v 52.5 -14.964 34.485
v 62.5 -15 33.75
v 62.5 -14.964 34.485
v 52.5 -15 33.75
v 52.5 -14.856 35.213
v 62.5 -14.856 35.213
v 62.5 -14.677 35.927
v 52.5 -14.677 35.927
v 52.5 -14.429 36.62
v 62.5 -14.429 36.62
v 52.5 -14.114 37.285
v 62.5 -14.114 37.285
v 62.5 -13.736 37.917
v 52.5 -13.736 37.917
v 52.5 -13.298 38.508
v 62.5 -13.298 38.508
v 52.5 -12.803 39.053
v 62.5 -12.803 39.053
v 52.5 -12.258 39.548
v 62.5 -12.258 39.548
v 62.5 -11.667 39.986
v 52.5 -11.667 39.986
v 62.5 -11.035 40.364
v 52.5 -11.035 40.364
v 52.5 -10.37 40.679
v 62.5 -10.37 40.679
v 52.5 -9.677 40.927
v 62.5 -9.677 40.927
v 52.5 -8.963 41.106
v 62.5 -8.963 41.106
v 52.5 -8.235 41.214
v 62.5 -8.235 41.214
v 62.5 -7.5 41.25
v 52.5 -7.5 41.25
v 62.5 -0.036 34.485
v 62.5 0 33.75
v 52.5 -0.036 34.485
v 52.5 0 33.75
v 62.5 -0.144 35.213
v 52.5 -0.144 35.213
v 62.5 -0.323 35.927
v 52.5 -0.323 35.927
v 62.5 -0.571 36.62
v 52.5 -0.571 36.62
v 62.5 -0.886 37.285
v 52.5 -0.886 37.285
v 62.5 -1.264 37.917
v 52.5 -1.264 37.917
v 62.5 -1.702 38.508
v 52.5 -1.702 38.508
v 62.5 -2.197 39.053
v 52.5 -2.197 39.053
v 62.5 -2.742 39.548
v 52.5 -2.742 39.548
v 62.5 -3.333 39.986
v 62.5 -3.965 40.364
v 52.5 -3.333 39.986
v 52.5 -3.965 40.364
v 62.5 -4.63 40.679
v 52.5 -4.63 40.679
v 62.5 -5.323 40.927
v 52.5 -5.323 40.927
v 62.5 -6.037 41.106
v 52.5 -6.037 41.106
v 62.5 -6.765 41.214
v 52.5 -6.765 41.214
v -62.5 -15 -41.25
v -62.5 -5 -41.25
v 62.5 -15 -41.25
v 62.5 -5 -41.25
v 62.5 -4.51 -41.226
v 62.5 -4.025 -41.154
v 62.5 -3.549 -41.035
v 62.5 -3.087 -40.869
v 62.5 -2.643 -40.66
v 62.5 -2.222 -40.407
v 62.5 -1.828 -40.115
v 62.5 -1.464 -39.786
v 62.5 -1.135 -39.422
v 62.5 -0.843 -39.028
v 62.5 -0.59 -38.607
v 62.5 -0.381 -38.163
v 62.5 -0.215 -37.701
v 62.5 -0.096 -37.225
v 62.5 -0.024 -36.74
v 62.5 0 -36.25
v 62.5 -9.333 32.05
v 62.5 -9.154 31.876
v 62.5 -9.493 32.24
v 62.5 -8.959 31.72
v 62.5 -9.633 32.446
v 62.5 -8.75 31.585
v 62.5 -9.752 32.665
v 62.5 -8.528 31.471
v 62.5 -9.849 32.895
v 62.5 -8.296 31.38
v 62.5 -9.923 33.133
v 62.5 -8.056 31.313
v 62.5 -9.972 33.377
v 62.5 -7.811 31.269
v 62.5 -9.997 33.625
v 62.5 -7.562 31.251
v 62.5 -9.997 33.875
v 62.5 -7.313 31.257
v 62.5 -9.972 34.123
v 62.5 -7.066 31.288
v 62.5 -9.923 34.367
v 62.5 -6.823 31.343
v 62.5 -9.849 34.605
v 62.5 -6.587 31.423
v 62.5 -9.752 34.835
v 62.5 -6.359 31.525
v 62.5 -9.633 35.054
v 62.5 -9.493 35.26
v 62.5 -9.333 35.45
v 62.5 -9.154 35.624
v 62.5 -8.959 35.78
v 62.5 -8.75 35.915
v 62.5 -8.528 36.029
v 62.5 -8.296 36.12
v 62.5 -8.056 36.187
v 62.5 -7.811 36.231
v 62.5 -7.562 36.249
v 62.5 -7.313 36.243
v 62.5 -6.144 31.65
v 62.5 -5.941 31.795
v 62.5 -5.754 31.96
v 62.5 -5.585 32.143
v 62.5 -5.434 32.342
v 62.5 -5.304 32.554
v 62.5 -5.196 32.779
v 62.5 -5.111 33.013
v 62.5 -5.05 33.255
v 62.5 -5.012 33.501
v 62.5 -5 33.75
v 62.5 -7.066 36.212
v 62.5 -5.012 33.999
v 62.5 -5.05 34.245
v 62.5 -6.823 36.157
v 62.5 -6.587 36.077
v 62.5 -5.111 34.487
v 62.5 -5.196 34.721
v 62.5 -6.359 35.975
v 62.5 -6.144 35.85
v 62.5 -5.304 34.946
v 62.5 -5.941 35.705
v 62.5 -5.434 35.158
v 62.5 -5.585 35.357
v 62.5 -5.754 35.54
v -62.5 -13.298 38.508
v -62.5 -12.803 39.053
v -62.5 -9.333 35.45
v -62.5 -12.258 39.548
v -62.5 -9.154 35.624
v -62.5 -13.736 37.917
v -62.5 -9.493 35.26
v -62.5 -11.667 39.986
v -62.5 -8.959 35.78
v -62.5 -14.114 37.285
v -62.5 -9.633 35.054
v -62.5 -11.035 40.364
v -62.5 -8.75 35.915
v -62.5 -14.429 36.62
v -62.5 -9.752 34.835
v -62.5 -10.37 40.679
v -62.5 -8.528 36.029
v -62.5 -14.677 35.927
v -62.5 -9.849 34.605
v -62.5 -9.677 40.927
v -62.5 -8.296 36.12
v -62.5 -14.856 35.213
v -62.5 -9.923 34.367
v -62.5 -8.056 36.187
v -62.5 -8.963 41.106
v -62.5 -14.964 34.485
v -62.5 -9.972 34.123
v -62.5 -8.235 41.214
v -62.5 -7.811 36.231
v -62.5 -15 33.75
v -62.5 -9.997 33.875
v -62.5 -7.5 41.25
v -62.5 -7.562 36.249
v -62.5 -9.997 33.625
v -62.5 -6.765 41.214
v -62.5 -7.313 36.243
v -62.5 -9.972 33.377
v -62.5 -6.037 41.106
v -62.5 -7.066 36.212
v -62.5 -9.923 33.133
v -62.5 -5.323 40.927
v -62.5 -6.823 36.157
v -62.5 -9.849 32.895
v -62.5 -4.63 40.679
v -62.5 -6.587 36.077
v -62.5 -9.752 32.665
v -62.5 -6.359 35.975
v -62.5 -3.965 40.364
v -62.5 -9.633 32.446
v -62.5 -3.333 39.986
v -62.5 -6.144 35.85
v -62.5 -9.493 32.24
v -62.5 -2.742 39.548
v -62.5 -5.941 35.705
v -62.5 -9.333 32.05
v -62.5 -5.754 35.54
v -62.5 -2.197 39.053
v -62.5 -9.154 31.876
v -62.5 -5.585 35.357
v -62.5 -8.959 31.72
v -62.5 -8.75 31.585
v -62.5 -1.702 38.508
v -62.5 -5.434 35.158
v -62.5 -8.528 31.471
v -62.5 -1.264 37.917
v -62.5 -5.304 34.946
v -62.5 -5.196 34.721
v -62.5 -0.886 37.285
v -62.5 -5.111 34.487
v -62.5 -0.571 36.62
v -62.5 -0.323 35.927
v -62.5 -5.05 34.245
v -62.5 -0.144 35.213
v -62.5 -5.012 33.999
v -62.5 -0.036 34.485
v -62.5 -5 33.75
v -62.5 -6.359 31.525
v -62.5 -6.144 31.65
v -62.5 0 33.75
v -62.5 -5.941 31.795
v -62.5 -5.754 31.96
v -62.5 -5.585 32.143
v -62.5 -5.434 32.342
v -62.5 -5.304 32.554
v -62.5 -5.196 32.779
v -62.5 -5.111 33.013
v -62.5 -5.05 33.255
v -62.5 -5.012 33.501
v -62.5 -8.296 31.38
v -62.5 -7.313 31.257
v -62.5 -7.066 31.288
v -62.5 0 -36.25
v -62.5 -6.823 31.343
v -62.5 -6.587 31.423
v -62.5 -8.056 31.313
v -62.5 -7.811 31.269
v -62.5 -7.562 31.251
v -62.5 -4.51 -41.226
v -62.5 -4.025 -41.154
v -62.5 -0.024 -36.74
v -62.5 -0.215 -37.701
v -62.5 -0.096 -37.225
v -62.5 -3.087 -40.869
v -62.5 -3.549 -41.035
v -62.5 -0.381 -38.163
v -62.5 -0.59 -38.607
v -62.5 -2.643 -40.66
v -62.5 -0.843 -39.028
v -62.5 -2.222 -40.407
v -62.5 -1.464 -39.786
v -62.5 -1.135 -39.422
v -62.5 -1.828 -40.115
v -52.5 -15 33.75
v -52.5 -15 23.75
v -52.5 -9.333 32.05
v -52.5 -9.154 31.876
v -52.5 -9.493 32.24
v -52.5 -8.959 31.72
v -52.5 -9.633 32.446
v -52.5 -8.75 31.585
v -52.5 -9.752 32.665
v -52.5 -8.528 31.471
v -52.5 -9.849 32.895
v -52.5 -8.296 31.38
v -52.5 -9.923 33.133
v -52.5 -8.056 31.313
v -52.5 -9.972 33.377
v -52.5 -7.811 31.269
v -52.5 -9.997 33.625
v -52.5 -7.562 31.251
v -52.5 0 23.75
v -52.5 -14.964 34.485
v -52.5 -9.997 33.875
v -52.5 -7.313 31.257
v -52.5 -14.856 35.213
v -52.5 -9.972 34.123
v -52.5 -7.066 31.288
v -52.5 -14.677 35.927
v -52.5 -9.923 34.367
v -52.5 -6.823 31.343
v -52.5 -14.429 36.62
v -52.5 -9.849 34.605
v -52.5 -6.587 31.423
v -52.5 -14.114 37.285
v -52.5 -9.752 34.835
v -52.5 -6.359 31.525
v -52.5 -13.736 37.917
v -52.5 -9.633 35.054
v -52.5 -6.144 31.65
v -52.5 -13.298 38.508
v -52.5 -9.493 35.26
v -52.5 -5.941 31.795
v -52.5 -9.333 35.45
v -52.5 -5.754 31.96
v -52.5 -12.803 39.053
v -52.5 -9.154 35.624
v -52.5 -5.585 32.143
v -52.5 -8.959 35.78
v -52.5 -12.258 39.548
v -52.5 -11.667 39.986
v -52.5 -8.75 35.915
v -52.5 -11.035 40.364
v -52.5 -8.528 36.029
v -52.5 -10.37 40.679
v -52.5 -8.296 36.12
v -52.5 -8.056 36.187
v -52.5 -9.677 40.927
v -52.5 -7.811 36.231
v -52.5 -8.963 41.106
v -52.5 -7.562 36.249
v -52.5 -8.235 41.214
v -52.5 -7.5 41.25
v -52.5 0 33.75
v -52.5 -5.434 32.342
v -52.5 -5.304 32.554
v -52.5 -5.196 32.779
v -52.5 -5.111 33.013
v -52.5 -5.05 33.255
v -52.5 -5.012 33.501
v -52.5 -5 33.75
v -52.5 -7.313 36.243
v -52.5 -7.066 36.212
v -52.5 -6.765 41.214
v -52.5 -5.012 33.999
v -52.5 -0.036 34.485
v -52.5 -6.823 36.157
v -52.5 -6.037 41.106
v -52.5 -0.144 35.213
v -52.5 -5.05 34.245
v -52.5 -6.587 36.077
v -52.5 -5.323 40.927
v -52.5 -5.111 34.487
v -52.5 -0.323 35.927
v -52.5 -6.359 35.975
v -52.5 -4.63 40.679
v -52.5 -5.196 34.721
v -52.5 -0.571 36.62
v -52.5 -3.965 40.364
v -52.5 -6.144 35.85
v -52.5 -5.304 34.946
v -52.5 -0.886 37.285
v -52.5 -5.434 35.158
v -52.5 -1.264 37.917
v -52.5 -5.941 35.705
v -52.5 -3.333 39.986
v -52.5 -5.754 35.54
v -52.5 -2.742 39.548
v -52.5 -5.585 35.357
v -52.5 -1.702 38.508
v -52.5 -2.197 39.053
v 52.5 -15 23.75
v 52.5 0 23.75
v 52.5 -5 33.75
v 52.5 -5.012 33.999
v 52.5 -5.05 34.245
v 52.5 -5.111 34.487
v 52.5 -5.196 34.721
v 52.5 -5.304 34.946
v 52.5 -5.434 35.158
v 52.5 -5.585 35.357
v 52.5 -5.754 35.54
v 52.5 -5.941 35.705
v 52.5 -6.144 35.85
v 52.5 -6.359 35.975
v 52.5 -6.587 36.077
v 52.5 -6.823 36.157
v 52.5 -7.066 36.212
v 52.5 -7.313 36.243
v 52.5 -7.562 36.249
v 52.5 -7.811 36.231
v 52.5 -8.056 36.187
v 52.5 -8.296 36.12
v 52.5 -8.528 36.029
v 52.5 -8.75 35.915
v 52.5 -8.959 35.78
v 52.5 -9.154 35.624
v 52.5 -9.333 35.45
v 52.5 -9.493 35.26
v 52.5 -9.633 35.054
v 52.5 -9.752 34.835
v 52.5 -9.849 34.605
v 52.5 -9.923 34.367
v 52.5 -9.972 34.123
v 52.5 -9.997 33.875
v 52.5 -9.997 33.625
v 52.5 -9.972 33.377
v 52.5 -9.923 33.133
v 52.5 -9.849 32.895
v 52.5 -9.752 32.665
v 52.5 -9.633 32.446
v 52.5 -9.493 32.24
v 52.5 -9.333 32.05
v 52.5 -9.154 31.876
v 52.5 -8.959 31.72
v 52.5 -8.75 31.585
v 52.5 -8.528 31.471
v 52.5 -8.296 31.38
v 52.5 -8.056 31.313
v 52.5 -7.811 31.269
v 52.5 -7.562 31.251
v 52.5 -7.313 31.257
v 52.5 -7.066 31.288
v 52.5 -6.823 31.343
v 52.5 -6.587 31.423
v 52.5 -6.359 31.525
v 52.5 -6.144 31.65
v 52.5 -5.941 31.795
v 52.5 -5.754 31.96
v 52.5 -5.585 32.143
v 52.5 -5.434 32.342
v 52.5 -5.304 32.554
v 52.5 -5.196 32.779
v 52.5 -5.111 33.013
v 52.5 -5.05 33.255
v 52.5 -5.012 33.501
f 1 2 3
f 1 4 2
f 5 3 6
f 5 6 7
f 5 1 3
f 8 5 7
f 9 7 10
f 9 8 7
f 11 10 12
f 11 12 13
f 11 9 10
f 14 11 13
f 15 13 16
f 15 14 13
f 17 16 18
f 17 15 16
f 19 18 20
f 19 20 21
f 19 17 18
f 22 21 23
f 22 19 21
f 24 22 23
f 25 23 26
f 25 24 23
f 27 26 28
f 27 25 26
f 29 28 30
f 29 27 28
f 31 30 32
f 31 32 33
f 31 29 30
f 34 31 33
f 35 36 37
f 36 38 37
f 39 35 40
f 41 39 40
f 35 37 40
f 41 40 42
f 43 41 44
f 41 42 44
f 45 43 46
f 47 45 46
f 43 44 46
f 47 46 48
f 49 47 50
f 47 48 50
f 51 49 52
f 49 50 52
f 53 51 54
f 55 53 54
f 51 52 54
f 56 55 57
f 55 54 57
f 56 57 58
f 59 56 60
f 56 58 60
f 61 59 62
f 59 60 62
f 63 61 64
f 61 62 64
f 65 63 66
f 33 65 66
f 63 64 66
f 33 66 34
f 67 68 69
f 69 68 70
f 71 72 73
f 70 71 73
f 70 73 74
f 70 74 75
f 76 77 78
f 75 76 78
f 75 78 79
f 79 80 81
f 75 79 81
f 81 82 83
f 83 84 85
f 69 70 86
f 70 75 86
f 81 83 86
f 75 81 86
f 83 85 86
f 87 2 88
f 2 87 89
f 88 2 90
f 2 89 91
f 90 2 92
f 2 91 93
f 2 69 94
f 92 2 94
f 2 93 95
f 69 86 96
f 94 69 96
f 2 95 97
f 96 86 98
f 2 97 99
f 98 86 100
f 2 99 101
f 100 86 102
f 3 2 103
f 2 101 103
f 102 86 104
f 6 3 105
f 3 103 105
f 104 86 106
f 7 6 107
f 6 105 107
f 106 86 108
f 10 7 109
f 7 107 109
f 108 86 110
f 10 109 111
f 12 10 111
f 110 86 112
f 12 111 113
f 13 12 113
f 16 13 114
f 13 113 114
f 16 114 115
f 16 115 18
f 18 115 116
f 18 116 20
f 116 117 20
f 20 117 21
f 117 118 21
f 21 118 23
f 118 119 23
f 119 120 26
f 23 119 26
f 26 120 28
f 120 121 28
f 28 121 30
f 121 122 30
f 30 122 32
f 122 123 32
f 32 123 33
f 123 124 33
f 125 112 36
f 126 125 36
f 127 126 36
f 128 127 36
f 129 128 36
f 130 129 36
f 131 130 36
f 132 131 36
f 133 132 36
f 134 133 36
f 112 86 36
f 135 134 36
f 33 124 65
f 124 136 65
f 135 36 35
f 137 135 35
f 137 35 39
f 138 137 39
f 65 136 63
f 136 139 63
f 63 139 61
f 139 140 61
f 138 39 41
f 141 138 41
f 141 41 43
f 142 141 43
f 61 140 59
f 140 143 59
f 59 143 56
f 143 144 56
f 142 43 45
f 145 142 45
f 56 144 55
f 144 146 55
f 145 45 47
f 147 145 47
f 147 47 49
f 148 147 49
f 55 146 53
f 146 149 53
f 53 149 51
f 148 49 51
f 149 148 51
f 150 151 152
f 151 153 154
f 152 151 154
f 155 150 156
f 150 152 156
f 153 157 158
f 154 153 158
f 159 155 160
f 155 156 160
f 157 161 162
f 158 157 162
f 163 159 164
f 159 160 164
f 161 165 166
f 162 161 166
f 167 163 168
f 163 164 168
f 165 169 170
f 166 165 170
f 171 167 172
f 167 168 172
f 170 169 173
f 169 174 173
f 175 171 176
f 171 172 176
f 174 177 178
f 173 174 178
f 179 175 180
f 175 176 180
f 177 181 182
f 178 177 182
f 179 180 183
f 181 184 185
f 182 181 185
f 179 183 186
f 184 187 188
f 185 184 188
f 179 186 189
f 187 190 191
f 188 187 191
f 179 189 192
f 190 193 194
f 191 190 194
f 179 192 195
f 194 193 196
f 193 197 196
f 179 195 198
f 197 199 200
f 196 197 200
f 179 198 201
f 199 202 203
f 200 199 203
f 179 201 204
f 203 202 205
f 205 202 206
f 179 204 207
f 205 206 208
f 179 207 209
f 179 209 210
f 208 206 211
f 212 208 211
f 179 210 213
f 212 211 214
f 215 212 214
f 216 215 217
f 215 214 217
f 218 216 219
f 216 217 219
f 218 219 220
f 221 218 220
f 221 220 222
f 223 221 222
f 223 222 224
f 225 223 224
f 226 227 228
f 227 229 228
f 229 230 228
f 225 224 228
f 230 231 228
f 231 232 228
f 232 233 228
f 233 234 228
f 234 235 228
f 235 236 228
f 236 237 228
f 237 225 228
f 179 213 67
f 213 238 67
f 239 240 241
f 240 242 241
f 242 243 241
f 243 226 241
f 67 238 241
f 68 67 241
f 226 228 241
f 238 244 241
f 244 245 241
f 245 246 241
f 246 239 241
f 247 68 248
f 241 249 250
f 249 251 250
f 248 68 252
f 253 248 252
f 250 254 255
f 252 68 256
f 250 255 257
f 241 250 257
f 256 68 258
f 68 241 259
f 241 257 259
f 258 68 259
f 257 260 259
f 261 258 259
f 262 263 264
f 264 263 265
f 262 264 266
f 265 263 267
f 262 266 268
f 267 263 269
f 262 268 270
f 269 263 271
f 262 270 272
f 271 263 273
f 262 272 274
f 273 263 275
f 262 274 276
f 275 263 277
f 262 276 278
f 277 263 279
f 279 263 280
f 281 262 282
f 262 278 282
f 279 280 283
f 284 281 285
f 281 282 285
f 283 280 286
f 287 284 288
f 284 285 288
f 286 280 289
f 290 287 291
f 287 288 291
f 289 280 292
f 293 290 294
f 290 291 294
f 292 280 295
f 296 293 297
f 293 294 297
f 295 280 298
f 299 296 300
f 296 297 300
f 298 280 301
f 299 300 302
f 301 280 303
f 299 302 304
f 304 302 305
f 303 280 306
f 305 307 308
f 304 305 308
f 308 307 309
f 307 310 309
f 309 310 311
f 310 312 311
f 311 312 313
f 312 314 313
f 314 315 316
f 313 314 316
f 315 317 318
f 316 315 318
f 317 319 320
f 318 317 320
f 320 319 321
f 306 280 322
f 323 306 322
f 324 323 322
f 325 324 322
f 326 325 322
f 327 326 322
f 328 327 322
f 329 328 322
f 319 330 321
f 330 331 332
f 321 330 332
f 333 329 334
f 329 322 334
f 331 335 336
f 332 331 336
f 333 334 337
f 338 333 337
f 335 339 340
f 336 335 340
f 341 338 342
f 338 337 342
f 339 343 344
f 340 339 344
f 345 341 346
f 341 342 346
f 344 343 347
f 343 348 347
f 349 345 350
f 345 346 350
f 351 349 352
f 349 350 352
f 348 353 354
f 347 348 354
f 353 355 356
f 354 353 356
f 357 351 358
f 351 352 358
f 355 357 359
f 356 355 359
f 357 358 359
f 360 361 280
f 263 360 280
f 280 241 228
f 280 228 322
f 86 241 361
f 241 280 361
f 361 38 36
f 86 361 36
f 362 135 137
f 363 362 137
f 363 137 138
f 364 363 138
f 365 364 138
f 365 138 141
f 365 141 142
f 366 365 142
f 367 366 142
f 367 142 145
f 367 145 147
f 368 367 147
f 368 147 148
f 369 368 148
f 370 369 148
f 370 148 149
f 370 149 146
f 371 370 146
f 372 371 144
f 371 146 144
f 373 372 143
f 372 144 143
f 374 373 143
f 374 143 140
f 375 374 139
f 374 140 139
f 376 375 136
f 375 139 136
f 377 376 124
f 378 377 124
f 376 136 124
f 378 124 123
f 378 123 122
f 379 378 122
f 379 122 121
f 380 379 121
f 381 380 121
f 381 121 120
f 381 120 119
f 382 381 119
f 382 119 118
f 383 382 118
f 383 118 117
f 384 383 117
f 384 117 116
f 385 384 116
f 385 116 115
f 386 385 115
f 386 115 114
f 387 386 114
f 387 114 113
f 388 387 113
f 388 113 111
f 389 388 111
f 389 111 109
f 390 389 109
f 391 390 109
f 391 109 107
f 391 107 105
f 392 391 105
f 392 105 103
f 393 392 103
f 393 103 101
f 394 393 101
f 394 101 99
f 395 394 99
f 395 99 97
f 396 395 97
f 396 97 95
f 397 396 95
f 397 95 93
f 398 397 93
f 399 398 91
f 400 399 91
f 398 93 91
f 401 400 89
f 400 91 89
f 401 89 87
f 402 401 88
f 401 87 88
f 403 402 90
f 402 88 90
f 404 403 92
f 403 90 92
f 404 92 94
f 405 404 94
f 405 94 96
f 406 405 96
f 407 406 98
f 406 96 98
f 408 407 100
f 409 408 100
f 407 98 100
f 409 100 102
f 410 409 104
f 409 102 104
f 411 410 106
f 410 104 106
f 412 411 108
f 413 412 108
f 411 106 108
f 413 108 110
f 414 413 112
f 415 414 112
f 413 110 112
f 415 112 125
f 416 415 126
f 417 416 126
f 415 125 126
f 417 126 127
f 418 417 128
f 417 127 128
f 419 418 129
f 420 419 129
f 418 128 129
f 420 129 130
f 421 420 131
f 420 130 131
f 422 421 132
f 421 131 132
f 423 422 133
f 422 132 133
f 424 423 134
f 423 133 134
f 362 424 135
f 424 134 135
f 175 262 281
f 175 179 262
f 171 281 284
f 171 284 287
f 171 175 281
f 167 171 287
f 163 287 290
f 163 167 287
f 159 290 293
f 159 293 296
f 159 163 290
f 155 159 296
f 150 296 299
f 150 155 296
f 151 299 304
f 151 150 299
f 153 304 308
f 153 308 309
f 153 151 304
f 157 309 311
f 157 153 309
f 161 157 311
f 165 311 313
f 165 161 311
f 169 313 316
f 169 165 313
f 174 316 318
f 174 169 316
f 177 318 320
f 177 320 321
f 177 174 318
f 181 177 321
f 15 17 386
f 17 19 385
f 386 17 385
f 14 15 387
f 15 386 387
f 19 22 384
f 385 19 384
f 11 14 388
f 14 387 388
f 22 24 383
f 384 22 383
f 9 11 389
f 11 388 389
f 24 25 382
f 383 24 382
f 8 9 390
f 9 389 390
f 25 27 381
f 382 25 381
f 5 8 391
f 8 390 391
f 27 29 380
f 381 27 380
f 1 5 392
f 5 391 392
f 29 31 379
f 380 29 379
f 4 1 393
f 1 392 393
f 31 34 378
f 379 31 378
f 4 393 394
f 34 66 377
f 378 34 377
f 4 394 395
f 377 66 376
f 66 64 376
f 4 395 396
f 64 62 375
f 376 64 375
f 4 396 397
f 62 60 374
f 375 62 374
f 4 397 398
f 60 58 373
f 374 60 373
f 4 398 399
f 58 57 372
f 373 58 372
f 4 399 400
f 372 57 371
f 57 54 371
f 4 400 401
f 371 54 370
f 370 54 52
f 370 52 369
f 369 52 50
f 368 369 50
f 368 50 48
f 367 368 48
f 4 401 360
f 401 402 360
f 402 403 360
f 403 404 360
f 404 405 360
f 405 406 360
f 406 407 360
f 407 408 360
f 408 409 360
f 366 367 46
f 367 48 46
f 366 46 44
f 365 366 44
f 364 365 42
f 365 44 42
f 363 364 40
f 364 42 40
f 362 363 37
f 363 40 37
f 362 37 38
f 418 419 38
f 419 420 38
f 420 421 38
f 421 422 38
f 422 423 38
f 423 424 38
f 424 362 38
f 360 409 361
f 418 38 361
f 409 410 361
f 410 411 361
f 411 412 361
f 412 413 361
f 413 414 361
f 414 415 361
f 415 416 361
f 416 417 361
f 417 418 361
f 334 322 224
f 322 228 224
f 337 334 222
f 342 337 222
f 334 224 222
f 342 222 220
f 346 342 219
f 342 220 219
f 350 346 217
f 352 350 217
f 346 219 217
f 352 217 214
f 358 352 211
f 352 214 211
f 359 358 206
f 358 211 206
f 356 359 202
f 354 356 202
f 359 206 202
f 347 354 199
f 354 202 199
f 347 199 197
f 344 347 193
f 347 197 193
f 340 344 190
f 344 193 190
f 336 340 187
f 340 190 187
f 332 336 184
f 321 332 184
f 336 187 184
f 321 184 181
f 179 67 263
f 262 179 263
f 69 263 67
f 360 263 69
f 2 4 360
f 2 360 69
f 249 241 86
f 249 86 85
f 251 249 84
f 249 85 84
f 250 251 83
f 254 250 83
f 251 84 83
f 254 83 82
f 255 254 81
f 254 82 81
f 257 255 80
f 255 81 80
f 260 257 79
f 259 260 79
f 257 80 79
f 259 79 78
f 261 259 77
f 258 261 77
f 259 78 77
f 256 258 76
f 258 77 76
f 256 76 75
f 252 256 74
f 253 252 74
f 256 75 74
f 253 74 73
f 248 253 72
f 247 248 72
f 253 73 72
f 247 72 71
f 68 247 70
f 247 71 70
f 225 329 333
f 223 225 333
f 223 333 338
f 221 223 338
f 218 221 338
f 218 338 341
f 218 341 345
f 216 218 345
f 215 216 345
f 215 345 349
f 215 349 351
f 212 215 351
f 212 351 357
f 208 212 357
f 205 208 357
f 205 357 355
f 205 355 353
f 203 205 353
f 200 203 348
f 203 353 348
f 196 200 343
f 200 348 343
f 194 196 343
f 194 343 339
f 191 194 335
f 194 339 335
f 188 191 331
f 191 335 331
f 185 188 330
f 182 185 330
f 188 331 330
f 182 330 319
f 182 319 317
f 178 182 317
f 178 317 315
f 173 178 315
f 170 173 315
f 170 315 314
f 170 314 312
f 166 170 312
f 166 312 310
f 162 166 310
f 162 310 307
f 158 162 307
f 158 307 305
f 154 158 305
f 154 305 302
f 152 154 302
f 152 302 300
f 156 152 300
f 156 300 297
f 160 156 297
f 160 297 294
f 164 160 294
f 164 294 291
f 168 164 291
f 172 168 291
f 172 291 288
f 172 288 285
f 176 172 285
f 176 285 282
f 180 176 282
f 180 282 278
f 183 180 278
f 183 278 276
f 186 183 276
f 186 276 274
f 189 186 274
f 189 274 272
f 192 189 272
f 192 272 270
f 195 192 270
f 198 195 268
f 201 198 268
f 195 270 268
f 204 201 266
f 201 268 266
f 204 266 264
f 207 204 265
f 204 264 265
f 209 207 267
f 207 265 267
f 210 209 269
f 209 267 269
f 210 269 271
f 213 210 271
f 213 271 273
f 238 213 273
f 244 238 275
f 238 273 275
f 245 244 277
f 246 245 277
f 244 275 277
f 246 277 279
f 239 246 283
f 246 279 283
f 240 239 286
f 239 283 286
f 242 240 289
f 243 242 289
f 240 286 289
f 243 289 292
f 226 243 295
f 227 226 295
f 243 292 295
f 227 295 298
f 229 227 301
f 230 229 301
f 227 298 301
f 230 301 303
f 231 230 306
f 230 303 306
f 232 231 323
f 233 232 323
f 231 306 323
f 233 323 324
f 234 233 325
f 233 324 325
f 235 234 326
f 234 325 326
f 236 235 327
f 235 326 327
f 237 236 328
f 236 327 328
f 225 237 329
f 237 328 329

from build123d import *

# Parameters (mm, degrees)
F1_DEPTH = 15
F2_R     = 2.5
F3_DEPTH = 125.001
F4_R     = 7.49999
F5_R     = 5


# Not quite as in the source:
# - a fillet or chamfer is up to 0.001 mm smaller than in the source, because OpenCascade refuses the exact size


with BuildPart() as f1:
    # F0 (on Front) → F1 (new body)
    with BuildSketch(Plane.XZ):
        Polygon((-62.5, 23.75), (-62.5, -41.25), (62.5, -41.25), (62.5, 23.75), (62.5, 41.25), (52.5, 41.25), (52.5, 23.75), (-52.5, 23.75), (-52.5, 41.25), (-62.5, 41.25), align=None)
    extrude(amount=F1_DEPTH)

    # F2 (on face) → F3 (cut, through all)
    with BuildSketch(Plane.YZ.offset(62.5)):
        with Locations((-7.5, 33.75)):
            Circle(F2_R)
    extrude(amount=-F3_DEPTH, mode=Mode.SUBTRACT)

    # F4 (radius 7.5 in the source; OpenCascade refuses exactly that, so slightly less here)
    f4_edges = [f1.edges().sort_by_distance(p)[0] for p in [
        (57.5, 0, 41.25),
        (57.5, -15, 41.25),
        (-57.5, -15, 41.25),
        (-57.5, 0, 41.25),
    ]]
    fillet(f4_edges, radius=F4_R)

    # F5
    f5_edges = [f1.edges().sort_by_distance(p)[0] for p in [
        (0, 0, -41.25),
    ]]
    fillet(f5_edges, radius=F5_R)


solid = f1.part
